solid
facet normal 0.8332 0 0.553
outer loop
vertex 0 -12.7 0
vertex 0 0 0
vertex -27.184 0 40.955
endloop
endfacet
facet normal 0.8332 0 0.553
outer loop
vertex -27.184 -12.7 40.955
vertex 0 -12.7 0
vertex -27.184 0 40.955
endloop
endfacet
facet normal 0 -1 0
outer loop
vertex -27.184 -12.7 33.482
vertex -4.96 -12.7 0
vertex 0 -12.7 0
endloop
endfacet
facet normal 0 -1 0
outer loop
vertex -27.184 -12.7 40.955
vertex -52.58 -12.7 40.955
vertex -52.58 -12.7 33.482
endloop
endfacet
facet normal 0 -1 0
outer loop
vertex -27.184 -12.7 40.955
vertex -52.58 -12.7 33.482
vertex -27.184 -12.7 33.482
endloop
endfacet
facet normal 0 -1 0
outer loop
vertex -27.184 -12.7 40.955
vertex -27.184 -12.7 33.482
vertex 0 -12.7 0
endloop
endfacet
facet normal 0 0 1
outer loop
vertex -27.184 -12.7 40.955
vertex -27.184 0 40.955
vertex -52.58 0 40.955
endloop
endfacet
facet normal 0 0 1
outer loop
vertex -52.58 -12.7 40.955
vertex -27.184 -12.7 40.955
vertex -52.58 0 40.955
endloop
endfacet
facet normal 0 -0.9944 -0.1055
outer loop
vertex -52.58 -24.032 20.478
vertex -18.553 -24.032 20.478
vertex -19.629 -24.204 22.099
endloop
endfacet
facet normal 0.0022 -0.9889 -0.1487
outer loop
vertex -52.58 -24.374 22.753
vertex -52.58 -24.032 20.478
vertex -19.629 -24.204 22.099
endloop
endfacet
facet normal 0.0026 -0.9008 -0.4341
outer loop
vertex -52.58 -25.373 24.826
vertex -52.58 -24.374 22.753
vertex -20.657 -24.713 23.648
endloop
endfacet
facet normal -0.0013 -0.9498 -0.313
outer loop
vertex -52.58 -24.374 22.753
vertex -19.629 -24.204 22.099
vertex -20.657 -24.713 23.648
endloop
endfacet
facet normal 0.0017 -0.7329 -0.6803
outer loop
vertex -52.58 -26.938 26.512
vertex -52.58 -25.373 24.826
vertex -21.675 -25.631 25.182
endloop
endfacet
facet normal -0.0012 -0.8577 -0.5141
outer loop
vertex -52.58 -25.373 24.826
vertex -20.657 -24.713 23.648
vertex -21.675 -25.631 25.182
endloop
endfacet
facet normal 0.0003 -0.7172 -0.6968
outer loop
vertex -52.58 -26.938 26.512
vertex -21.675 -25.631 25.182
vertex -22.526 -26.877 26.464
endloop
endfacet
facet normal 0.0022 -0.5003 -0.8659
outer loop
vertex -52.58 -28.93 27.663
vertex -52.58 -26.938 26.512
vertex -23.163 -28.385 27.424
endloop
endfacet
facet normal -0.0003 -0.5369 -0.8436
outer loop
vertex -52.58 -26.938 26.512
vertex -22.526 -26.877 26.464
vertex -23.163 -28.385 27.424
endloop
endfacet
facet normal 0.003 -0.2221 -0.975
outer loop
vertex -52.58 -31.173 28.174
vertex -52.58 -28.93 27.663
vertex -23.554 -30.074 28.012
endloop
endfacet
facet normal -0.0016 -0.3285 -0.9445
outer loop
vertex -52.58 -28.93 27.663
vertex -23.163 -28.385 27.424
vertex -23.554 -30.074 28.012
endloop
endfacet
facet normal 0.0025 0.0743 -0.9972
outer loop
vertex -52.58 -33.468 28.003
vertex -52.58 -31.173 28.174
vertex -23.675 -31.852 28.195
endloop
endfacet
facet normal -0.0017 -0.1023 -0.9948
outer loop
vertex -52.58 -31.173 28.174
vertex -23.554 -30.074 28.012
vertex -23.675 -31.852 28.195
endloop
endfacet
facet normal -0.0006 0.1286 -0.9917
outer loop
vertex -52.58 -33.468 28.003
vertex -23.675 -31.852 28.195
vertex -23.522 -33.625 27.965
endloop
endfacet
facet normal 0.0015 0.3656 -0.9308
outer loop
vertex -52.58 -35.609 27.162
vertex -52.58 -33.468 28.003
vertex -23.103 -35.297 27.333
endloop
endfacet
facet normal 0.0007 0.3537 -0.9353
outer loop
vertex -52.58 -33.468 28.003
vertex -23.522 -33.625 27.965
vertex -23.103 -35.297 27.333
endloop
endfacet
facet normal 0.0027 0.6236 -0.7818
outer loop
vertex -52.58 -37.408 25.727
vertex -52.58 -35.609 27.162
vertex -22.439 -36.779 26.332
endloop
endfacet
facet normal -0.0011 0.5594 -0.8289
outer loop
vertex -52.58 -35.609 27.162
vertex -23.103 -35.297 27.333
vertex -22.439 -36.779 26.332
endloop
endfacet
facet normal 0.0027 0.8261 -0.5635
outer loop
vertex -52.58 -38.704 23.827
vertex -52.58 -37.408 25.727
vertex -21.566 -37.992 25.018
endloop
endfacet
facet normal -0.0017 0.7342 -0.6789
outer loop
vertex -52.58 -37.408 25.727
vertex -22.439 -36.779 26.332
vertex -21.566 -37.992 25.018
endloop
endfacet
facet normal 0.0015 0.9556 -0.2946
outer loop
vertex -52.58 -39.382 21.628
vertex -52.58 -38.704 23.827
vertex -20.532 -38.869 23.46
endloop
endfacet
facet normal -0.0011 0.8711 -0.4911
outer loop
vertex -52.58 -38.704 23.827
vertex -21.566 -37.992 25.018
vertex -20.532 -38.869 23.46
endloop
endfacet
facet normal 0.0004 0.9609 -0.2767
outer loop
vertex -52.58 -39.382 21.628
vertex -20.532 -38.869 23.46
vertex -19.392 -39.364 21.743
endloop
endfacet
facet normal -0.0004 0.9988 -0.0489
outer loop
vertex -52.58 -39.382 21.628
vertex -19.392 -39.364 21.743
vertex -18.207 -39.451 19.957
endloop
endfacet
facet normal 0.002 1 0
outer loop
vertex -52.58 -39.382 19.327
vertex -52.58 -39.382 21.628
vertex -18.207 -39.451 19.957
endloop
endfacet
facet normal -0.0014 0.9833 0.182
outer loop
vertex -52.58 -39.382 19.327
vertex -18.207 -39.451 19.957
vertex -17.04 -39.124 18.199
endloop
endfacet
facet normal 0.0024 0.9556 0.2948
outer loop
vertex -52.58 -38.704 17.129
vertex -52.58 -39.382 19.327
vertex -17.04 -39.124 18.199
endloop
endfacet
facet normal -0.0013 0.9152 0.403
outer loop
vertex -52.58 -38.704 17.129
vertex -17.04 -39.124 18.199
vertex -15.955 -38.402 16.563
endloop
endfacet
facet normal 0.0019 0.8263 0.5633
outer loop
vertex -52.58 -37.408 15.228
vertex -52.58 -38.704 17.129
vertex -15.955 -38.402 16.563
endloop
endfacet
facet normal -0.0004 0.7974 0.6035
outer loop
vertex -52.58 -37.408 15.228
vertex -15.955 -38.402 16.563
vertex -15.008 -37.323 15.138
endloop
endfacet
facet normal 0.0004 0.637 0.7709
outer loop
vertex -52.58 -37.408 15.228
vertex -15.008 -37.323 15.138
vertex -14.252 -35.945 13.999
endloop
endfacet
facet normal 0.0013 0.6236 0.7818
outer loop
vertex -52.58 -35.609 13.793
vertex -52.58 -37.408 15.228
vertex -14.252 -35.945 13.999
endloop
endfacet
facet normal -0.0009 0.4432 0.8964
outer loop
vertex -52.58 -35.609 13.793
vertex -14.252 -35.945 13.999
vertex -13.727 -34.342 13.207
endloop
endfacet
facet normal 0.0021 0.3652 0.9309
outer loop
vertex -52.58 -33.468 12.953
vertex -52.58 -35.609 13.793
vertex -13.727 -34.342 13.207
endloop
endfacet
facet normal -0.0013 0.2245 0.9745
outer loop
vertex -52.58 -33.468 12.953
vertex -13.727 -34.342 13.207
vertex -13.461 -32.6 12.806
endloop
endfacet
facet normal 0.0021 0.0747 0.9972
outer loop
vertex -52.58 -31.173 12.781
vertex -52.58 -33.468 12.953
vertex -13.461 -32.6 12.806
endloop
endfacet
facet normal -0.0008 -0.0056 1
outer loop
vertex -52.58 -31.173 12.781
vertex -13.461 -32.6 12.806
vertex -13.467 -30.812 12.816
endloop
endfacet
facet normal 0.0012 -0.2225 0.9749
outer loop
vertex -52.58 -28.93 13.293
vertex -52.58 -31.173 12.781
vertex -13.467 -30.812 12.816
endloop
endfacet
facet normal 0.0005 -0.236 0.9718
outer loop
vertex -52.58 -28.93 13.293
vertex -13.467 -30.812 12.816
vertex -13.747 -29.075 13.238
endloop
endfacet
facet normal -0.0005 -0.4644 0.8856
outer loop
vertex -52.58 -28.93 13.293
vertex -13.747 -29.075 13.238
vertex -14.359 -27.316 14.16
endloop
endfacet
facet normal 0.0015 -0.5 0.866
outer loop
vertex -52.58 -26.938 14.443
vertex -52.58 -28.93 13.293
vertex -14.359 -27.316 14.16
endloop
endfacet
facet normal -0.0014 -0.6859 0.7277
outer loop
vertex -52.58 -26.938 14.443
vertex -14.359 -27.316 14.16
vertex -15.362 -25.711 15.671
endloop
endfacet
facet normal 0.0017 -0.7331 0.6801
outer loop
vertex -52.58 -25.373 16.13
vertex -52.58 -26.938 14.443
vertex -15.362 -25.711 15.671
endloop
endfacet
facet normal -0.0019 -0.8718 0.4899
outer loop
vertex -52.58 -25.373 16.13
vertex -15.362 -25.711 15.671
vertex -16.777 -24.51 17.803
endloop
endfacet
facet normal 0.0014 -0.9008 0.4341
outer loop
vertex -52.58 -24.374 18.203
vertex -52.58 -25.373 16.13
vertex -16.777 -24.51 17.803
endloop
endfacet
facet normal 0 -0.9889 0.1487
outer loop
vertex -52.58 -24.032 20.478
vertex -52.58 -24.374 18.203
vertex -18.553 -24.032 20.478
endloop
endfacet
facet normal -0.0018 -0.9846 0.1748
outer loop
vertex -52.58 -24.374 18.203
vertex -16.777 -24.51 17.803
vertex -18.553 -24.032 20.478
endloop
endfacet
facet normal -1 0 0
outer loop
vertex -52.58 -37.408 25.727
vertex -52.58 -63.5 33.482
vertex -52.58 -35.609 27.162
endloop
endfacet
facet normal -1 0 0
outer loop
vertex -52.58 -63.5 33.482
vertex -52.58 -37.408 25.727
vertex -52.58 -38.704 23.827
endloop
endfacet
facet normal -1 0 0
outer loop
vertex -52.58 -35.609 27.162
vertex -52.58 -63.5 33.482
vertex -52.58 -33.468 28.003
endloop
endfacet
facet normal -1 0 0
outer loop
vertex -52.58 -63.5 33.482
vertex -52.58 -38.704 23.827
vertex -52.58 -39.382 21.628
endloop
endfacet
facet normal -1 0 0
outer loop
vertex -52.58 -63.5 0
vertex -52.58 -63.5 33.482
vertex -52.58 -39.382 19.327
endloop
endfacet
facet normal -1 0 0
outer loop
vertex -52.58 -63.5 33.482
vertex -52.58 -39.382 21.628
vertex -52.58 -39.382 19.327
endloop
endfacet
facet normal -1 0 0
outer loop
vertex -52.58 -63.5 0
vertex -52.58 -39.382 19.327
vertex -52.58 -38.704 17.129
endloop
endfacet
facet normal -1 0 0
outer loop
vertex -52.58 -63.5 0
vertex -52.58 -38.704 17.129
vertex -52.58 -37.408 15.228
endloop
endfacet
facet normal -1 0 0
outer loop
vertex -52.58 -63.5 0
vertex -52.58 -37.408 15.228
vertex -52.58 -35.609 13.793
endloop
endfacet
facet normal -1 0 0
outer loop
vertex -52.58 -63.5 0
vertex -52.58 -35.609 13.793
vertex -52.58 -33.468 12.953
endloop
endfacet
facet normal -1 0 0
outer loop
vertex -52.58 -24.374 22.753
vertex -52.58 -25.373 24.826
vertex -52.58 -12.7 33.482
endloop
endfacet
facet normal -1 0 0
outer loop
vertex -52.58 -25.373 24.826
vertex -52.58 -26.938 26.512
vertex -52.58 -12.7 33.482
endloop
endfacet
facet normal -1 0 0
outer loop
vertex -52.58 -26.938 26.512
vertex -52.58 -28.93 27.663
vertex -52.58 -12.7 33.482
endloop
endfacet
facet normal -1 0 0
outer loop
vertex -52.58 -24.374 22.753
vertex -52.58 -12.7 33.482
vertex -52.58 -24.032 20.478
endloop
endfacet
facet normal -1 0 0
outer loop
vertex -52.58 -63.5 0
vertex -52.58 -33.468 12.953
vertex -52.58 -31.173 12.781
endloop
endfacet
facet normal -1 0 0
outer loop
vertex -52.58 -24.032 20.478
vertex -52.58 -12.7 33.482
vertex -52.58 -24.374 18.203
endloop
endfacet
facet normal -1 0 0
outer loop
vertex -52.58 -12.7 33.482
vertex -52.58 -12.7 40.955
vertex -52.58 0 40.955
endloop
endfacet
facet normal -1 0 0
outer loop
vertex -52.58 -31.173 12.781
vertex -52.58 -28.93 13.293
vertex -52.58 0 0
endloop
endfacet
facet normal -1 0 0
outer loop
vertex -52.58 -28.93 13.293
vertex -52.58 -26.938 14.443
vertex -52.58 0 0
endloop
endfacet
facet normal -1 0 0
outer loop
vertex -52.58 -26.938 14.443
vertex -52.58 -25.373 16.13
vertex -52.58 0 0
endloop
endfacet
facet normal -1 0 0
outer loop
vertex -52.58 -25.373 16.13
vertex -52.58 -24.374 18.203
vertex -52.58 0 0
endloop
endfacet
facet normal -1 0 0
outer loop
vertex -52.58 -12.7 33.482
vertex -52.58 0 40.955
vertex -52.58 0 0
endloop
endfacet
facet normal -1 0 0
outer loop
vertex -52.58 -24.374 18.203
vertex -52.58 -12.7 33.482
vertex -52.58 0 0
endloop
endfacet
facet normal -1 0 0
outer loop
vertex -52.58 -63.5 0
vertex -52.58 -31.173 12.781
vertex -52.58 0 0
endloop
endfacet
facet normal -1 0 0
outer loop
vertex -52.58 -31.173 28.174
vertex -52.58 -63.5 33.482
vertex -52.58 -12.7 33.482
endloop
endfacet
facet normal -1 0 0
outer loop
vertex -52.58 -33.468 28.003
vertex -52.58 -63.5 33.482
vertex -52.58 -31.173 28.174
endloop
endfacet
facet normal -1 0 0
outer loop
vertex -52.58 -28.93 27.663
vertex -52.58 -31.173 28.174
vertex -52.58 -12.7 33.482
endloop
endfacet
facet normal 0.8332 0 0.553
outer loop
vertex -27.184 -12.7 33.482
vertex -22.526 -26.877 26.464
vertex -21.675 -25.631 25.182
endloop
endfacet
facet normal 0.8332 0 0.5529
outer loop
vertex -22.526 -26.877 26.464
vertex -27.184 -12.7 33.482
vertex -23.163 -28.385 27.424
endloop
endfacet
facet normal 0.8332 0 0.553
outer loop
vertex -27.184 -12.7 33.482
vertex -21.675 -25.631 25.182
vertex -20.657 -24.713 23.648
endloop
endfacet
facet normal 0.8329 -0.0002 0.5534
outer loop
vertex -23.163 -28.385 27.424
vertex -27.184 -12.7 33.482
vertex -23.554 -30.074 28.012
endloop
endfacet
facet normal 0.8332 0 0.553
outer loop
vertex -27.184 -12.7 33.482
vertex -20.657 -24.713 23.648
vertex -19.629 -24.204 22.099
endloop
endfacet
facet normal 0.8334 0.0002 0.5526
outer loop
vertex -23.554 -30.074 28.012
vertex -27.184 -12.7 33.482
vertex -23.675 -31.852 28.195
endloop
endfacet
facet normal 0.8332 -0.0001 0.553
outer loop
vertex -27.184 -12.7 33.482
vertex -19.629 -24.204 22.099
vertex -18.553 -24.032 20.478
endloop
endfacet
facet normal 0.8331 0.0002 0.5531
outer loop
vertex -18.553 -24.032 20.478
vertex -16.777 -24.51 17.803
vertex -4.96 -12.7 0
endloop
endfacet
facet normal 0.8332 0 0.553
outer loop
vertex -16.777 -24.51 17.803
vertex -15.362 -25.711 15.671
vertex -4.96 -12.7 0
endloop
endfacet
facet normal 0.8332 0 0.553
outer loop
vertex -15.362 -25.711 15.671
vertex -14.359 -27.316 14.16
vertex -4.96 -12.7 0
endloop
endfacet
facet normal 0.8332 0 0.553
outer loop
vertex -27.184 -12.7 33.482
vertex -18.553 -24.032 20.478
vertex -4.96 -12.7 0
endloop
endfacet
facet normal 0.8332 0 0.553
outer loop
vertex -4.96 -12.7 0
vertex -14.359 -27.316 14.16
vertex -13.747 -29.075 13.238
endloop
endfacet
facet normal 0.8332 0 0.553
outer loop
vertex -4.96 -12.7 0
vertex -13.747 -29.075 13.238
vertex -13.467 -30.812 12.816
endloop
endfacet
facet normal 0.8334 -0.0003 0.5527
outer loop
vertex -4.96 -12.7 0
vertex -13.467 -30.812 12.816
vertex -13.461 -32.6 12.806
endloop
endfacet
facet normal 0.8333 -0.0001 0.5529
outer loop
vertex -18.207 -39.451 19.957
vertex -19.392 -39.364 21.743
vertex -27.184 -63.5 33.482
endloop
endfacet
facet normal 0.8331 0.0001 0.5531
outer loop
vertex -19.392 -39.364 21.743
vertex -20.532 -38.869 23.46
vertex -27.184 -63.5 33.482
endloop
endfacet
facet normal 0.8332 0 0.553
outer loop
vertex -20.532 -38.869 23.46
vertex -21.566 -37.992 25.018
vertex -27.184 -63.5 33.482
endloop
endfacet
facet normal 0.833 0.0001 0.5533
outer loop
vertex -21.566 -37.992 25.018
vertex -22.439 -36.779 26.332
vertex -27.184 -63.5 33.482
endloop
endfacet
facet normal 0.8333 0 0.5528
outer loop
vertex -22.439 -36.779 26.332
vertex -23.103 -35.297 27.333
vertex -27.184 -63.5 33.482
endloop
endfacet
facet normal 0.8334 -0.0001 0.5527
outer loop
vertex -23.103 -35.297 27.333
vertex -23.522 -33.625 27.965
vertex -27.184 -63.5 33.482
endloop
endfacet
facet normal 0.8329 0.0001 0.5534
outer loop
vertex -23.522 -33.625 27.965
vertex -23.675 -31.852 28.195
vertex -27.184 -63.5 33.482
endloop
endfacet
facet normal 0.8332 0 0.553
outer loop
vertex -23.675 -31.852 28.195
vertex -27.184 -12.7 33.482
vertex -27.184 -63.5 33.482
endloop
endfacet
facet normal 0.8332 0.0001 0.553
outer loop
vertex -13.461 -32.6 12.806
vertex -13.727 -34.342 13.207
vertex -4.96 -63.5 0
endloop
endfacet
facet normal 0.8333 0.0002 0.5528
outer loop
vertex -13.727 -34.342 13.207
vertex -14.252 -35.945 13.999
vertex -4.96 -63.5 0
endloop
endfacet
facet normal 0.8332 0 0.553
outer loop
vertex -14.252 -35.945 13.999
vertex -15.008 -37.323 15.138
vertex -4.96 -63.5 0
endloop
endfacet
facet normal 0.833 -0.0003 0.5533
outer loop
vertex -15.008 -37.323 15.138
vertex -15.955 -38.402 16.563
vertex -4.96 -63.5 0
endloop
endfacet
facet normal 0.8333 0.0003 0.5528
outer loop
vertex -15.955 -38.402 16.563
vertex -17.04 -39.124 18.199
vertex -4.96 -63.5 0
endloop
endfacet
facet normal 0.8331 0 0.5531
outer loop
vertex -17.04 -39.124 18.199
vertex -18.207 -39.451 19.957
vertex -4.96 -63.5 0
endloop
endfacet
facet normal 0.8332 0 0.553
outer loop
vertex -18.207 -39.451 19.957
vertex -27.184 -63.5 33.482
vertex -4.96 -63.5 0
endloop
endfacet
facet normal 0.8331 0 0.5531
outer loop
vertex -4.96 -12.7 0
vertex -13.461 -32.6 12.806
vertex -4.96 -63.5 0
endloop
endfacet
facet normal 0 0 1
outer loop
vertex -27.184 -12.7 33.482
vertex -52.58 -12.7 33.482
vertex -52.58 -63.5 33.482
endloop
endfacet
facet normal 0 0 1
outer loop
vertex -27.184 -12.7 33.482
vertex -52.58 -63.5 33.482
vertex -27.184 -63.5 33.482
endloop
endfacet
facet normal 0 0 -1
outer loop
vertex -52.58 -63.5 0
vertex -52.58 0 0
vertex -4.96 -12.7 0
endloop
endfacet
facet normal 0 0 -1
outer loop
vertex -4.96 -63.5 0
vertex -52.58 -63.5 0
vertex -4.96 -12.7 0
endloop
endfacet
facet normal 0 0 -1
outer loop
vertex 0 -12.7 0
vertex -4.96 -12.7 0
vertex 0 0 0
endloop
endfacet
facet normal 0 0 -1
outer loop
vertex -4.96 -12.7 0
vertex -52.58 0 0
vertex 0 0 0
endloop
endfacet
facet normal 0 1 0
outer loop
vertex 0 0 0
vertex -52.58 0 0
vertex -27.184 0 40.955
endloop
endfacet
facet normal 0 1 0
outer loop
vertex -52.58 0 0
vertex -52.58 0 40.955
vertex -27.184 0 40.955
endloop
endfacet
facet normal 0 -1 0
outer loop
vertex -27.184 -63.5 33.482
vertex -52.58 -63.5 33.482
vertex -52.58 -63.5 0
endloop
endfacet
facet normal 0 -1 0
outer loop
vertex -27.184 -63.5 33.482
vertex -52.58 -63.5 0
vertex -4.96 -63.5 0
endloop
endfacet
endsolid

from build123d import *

# Parameters (mm, degrees)
F1_DEPTH = 63.5
F2_R     = 7.718493
F3_DEPTH = 52.580988
F5_DEPTH = 50.8


with BuildPart() as f1:
    # F0 (on Front) → F1 (new body)
    with BuildSketch(Plane.XZ):
        Polygon((-52.579988, 0), (0, 0), (-27.184211, 40.955156), (-52.579988, 40.955156), align=None)
    extrude(amount=F1_DEPTH)

    # F2 (on Right) → F3 (cut, through all)
    with BuildSketch(Plane.YZ):
        with Locations((-31.75, 20.477578)):
            Circle(F2_R)
    extrude(amount=-F3_DEPTH, mode=Mode.SUBTRACT)

    # F4 (on face) → F5 (cut)
    with BuildSketch(Plane.XZ.offset(63.5)):
        Polygon((-52.579988, 40.955156), (-52.579988, 33.481799), (-27.184211, 33.481799), (-4.960482, 0), (0, 0), (-27.184211, 40.955156), align=None)
    extrude(amount=-F5_DEPTH, mode=Mode.SUBTRACT)


solid = f1.part
